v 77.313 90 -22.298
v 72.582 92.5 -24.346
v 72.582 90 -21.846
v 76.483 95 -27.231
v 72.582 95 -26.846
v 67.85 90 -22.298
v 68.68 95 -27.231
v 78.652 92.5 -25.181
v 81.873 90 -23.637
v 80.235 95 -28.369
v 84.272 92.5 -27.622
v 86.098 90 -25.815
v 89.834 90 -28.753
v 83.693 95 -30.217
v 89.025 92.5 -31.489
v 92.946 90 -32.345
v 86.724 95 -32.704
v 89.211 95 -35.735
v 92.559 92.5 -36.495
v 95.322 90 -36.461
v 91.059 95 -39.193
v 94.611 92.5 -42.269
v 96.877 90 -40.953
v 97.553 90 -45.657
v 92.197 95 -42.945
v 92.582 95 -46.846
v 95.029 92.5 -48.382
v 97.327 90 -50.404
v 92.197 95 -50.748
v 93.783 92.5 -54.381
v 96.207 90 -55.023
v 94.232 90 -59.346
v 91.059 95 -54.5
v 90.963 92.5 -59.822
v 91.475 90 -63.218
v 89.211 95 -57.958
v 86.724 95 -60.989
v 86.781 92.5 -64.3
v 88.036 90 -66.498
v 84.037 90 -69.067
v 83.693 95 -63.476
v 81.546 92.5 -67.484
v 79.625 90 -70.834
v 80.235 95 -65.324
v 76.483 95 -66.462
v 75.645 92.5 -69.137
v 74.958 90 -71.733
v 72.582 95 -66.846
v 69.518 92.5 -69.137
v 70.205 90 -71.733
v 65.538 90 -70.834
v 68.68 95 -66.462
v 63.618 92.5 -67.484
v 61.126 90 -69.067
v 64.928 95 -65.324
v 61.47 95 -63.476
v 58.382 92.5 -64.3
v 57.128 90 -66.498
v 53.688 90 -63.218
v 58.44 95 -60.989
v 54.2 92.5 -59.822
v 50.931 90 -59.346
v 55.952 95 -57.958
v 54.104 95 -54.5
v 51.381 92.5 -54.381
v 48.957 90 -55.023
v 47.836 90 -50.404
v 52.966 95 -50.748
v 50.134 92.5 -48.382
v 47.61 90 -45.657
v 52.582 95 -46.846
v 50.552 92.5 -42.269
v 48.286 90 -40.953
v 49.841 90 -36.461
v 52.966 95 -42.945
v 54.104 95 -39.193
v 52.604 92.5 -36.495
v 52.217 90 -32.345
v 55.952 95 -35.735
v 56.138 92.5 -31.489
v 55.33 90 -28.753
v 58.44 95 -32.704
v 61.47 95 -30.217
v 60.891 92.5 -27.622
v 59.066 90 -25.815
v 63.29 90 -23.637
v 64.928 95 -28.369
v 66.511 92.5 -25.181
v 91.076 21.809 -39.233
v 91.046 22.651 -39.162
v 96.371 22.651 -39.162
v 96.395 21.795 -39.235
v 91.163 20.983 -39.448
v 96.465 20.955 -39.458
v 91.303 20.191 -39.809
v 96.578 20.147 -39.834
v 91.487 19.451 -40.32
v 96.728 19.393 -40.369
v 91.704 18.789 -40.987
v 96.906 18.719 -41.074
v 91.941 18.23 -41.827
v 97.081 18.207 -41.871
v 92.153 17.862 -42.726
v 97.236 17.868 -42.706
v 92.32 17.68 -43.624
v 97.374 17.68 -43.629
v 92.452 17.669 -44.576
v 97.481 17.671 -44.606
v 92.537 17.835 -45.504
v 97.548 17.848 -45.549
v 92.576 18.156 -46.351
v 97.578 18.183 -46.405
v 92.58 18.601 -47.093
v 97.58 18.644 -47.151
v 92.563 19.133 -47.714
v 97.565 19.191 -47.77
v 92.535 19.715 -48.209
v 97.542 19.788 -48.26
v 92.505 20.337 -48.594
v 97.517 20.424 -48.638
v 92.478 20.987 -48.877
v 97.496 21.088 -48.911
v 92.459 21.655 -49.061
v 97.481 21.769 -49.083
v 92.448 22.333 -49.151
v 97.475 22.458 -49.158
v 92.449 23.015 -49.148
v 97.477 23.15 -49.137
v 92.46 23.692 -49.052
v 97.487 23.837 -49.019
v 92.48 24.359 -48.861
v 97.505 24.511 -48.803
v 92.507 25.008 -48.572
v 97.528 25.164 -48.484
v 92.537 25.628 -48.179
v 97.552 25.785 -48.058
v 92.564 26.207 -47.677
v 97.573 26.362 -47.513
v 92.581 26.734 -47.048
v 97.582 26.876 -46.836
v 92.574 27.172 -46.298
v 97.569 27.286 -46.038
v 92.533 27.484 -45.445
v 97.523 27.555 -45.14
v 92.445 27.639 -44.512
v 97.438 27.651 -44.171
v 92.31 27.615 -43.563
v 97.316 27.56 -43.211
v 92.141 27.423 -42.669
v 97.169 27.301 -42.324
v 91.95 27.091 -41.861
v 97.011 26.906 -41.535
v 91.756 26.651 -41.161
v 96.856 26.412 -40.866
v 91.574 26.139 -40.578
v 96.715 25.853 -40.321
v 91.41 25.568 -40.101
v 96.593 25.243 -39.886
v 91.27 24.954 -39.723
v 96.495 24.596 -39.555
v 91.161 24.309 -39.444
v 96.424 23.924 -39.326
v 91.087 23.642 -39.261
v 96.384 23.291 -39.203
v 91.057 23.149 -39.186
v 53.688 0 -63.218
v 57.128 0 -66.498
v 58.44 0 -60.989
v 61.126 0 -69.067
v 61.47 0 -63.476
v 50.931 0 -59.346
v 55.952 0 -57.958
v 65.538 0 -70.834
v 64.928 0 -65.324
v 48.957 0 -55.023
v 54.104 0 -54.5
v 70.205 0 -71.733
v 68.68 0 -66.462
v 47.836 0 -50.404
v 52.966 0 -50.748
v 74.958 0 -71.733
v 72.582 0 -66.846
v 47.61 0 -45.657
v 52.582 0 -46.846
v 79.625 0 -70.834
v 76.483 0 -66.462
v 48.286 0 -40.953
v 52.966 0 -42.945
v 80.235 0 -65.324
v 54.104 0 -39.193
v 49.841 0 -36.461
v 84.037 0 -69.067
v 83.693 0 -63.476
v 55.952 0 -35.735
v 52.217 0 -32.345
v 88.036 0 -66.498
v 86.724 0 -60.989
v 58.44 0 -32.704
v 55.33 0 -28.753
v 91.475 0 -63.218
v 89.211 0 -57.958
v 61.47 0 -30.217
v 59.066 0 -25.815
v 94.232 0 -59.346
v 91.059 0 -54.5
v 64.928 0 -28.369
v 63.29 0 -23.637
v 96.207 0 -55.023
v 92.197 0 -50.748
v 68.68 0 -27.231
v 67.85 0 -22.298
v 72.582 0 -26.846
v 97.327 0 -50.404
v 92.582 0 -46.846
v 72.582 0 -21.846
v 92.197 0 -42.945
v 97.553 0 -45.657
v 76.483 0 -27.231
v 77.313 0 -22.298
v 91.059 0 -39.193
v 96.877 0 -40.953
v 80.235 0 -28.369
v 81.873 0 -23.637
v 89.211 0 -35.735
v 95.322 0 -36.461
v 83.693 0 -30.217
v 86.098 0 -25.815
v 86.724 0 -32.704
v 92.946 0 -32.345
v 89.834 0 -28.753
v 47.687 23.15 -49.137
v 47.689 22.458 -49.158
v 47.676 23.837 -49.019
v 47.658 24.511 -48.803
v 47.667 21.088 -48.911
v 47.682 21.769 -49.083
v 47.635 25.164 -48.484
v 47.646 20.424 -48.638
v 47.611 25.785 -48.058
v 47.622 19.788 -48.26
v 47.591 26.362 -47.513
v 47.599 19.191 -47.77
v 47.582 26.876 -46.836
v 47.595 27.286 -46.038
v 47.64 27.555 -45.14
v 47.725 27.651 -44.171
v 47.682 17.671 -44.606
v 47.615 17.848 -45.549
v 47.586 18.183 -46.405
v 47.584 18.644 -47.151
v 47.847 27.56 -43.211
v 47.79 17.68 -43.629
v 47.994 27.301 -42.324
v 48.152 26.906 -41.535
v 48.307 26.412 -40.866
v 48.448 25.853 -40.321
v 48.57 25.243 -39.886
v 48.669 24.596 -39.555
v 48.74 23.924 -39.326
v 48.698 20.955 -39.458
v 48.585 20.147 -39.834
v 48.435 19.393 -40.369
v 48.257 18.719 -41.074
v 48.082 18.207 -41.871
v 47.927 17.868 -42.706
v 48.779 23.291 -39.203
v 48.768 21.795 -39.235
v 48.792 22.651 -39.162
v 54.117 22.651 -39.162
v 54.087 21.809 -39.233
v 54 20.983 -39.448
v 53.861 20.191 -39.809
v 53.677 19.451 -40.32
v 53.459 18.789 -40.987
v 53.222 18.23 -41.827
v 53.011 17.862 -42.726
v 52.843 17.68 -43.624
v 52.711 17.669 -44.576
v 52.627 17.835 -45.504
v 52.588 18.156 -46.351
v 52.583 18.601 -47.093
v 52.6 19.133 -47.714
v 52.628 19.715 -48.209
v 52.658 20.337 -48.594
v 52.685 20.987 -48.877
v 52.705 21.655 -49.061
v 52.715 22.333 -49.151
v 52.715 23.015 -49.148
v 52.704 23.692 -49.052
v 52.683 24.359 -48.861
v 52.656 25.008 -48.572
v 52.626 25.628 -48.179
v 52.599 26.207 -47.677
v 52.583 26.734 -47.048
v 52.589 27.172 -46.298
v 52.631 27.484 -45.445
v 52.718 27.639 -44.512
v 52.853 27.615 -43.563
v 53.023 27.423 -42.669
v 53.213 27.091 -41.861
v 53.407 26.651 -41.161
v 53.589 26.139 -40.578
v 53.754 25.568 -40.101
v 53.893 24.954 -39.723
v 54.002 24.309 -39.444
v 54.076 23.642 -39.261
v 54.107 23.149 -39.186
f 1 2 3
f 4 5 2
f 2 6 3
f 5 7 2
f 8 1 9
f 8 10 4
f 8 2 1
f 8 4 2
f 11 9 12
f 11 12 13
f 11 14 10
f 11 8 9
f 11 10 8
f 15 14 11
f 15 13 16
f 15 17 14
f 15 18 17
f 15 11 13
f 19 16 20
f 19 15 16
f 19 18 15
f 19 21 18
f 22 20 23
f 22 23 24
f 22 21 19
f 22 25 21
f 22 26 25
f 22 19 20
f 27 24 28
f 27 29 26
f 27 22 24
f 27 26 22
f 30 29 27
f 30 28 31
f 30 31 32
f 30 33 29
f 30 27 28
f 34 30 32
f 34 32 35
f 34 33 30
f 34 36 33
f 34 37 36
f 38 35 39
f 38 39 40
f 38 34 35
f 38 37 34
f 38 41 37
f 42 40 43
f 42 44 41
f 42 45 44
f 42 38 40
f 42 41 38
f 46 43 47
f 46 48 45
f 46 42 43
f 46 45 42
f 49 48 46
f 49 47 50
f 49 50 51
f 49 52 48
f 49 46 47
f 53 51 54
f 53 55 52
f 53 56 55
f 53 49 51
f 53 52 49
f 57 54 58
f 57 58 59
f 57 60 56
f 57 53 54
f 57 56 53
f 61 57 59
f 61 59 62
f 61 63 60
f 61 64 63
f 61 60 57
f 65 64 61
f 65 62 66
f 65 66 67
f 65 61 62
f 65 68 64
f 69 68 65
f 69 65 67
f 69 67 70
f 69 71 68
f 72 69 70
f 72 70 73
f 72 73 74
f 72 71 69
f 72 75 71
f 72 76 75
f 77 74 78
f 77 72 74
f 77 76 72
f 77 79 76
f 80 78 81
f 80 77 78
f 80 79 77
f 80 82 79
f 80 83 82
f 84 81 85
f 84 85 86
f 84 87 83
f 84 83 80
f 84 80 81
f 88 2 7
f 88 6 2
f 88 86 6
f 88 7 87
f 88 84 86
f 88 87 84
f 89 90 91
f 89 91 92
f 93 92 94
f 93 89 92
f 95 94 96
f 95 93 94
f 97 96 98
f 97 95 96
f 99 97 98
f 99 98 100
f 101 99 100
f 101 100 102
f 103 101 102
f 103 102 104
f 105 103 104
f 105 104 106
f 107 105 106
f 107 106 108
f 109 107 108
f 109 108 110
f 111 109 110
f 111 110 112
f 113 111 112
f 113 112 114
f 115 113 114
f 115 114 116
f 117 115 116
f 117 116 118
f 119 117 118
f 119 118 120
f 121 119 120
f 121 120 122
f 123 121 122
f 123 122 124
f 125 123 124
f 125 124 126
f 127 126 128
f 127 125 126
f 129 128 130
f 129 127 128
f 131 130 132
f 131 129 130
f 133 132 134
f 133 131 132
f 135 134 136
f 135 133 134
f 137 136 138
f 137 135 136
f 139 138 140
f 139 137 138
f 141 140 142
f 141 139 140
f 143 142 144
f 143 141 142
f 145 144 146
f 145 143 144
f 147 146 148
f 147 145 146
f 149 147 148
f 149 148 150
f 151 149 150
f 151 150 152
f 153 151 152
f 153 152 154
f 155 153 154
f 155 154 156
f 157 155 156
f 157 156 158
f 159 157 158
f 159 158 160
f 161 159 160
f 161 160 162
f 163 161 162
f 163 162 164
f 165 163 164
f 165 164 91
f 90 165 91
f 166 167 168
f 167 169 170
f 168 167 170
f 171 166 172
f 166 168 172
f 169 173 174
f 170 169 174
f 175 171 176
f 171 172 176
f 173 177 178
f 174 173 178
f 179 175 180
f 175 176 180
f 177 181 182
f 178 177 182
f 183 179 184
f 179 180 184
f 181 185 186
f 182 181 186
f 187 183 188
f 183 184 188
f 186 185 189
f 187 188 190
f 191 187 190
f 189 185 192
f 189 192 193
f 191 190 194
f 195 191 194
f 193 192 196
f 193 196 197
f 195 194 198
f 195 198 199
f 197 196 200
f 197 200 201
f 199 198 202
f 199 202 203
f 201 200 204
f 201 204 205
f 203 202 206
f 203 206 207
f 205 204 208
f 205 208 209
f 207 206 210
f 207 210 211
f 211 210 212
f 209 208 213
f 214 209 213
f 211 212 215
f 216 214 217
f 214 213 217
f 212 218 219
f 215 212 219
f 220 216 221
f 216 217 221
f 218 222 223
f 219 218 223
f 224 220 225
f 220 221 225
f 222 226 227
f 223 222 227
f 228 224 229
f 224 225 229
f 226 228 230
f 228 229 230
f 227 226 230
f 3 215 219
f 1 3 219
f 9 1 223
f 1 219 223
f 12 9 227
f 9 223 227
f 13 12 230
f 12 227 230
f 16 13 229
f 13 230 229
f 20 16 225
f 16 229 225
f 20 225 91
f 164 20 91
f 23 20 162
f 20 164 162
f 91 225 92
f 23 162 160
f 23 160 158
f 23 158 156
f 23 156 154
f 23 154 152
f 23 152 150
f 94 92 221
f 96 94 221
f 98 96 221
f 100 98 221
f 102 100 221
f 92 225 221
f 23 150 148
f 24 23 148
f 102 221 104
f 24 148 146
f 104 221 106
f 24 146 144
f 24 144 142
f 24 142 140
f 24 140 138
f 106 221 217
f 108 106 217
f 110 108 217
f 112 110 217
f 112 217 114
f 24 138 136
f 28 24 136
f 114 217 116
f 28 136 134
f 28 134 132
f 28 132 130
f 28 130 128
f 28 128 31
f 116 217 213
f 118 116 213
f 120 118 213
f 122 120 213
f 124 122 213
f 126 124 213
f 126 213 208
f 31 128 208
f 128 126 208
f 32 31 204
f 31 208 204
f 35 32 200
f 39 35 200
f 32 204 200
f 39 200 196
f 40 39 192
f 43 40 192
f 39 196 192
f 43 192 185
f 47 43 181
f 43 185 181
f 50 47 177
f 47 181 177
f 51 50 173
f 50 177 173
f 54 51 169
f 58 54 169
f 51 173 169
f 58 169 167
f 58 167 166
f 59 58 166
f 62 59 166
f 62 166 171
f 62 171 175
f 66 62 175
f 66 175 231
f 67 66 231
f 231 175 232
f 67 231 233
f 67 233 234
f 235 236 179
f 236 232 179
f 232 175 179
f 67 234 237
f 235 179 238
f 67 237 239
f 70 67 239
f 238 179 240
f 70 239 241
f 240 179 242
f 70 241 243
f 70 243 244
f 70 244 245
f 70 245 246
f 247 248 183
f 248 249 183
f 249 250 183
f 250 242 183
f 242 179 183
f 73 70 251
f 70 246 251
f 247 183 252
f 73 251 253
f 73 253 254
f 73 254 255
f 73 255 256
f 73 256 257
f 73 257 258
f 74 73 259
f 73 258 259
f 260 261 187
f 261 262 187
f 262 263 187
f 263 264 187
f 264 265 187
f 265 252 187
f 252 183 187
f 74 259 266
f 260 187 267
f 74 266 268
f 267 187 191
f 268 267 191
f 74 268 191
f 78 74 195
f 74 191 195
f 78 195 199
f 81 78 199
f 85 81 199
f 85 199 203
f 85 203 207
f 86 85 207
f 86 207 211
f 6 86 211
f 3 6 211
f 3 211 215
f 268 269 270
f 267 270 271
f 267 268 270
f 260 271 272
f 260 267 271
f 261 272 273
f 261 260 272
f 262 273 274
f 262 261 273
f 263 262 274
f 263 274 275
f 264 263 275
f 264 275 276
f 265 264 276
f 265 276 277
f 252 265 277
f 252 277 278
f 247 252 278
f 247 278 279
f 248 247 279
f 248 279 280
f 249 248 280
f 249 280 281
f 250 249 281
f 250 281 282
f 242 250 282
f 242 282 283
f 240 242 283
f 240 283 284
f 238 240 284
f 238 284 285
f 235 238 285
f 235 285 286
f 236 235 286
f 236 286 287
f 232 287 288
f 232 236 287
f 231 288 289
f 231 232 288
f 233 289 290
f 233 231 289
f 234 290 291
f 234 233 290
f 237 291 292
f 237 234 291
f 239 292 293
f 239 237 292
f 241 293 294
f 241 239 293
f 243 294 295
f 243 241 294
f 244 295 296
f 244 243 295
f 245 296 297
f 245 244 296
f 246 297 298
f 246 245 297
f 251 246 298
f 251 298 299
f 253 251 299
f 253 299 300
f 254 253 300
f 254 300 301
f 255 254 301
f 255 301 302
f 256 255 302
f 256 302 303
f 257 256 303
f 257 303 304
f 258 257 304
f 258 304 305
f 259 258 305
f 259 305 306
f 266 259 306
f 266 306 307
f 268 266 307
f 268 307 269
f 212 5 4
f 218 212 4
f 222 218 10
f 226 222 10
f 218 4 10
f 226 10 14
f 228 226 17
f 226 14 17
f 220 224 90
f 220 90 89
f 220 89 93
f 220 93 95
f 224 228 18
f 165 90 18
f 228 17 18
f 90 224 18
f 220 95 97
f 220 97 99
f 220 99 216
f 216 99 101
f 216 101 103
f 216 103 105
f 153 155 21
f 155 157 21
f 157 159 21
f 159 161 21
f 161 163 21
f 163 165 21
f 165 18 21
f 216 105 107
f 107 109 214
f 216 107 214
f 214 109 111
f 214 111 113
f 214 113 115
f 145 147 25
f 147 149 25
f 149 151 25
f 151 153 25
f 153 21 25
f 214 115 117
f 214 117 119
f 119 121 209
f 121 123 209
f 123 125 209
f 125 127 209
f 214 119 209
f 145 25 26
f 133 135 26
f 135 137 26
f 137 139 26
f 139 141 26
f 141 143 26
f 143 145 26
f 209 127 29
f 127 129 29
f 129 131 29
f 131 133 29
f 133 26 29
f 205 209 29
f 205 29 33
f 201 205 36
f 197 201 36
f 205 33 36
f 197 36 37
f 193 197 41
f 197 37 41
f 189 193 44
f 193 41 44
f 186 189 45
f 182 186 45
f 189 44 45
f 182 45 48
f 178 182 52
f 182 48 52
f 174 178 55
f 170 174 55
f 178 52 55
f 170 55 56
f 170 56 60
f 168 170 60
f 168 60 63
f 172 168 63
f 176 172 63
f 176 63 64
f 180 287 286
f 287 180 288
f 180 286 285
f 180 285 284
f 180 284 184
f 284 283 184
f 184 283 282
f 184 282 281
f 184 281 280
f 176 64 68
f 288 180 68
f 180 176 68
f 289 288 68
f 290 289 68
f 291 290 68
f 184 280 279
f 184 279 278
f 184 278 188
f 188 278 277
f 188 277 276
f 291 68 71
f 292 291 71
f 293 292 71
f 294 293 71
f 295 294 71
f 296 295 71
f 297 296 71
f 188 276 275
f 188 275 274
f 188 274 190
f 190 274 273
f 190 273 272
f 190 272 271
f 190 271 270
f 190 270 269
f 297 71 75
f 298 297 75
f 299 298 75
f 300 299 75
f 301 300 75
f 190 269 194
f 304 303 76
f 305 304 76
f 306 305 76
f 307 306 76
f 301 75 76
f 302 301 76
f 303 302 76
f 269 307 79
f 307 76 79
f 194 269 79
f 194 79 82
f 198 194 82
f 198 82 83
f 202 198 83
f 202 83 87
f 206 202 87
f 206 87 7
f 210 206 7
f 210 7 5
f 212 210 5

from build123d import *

# Parameters (mm, degrees)
SKETCH2_R           = 25
BOSS_EXTRUDE2_DEPTH = 100
SKETCH3_R           = 20
CUT_EXTRUDE1_DEPTH  = 158.111733872
CHAMFER2_SIZE       = 10
SKETCH4_R           = 5
CUT_EXTRUDE3_DEPTH  = 154.977585945


with BuildPart() as part:
    # Sketch2 → Boss-Extrude2 (new body)
    with BuildSketch(Plane(origin=(0, 0, 0), x_dir=(1, 0, 0), z_dir=(0, 1, 0))):
        with Locations(Location((72.581654817, 46.846486091, 0), (0, 0, 270))):
            Circle(SKETCH2_R)
    extrude(amount=BOSS_EXTRUDE2_DEPTH)

    # Sketch3 → Cut-Extrude1 (cut, through all)
    with BuildSketch(Plane(origin=(0, 100, 0), x_dir=(1, 0, 0), z_dir=(0, 1, 0))):
        with Locations(Location((72.581654817, 46.846486091, 0), (0, 0, 270))):
            Circle(SKETCH3_R)
    extrude(amount=-CUT_EXTRUDE1_DEPTH, mode=Mode.SUBTRACT)

    # Chamfer2
    # the kernel refuses this chamfer: 10 mm, written as the material it takes off along each edge
    with BuildSketch(Plane(origin=(72.581654817, 100, -46.846486091), x_dir=(0, 0, 1), z_dir=(-1, 0, 0))) as chamfer2_piece_1:
        Polygon((25, -CHAMFER2_SIZE), (25 - CHAMFER2_SIZE, 0), (25, 0), align=None)
    revolve(axis=Axis((72.581654817, 100, -46.846486091), (0, 1, 0)), mode=Mode.SUBTRACT)

    # Sketch4 → Cut-Extrude3 (cut, through all)
    with BuildSketch(Plane(origin=(0, 0, 0), x_dir=(0, 0, -1), z_dir=(1, 0, 0))):
        with Locations(Location((44.161502289, 22.651407336, 0), (0, 0, 180))):
            Circle(SKETCH4_R)
    extrude(amount=CUT_EXTRUDE3_DEPTH, mode=Mode.SUBTRACT)


solid = part.part
